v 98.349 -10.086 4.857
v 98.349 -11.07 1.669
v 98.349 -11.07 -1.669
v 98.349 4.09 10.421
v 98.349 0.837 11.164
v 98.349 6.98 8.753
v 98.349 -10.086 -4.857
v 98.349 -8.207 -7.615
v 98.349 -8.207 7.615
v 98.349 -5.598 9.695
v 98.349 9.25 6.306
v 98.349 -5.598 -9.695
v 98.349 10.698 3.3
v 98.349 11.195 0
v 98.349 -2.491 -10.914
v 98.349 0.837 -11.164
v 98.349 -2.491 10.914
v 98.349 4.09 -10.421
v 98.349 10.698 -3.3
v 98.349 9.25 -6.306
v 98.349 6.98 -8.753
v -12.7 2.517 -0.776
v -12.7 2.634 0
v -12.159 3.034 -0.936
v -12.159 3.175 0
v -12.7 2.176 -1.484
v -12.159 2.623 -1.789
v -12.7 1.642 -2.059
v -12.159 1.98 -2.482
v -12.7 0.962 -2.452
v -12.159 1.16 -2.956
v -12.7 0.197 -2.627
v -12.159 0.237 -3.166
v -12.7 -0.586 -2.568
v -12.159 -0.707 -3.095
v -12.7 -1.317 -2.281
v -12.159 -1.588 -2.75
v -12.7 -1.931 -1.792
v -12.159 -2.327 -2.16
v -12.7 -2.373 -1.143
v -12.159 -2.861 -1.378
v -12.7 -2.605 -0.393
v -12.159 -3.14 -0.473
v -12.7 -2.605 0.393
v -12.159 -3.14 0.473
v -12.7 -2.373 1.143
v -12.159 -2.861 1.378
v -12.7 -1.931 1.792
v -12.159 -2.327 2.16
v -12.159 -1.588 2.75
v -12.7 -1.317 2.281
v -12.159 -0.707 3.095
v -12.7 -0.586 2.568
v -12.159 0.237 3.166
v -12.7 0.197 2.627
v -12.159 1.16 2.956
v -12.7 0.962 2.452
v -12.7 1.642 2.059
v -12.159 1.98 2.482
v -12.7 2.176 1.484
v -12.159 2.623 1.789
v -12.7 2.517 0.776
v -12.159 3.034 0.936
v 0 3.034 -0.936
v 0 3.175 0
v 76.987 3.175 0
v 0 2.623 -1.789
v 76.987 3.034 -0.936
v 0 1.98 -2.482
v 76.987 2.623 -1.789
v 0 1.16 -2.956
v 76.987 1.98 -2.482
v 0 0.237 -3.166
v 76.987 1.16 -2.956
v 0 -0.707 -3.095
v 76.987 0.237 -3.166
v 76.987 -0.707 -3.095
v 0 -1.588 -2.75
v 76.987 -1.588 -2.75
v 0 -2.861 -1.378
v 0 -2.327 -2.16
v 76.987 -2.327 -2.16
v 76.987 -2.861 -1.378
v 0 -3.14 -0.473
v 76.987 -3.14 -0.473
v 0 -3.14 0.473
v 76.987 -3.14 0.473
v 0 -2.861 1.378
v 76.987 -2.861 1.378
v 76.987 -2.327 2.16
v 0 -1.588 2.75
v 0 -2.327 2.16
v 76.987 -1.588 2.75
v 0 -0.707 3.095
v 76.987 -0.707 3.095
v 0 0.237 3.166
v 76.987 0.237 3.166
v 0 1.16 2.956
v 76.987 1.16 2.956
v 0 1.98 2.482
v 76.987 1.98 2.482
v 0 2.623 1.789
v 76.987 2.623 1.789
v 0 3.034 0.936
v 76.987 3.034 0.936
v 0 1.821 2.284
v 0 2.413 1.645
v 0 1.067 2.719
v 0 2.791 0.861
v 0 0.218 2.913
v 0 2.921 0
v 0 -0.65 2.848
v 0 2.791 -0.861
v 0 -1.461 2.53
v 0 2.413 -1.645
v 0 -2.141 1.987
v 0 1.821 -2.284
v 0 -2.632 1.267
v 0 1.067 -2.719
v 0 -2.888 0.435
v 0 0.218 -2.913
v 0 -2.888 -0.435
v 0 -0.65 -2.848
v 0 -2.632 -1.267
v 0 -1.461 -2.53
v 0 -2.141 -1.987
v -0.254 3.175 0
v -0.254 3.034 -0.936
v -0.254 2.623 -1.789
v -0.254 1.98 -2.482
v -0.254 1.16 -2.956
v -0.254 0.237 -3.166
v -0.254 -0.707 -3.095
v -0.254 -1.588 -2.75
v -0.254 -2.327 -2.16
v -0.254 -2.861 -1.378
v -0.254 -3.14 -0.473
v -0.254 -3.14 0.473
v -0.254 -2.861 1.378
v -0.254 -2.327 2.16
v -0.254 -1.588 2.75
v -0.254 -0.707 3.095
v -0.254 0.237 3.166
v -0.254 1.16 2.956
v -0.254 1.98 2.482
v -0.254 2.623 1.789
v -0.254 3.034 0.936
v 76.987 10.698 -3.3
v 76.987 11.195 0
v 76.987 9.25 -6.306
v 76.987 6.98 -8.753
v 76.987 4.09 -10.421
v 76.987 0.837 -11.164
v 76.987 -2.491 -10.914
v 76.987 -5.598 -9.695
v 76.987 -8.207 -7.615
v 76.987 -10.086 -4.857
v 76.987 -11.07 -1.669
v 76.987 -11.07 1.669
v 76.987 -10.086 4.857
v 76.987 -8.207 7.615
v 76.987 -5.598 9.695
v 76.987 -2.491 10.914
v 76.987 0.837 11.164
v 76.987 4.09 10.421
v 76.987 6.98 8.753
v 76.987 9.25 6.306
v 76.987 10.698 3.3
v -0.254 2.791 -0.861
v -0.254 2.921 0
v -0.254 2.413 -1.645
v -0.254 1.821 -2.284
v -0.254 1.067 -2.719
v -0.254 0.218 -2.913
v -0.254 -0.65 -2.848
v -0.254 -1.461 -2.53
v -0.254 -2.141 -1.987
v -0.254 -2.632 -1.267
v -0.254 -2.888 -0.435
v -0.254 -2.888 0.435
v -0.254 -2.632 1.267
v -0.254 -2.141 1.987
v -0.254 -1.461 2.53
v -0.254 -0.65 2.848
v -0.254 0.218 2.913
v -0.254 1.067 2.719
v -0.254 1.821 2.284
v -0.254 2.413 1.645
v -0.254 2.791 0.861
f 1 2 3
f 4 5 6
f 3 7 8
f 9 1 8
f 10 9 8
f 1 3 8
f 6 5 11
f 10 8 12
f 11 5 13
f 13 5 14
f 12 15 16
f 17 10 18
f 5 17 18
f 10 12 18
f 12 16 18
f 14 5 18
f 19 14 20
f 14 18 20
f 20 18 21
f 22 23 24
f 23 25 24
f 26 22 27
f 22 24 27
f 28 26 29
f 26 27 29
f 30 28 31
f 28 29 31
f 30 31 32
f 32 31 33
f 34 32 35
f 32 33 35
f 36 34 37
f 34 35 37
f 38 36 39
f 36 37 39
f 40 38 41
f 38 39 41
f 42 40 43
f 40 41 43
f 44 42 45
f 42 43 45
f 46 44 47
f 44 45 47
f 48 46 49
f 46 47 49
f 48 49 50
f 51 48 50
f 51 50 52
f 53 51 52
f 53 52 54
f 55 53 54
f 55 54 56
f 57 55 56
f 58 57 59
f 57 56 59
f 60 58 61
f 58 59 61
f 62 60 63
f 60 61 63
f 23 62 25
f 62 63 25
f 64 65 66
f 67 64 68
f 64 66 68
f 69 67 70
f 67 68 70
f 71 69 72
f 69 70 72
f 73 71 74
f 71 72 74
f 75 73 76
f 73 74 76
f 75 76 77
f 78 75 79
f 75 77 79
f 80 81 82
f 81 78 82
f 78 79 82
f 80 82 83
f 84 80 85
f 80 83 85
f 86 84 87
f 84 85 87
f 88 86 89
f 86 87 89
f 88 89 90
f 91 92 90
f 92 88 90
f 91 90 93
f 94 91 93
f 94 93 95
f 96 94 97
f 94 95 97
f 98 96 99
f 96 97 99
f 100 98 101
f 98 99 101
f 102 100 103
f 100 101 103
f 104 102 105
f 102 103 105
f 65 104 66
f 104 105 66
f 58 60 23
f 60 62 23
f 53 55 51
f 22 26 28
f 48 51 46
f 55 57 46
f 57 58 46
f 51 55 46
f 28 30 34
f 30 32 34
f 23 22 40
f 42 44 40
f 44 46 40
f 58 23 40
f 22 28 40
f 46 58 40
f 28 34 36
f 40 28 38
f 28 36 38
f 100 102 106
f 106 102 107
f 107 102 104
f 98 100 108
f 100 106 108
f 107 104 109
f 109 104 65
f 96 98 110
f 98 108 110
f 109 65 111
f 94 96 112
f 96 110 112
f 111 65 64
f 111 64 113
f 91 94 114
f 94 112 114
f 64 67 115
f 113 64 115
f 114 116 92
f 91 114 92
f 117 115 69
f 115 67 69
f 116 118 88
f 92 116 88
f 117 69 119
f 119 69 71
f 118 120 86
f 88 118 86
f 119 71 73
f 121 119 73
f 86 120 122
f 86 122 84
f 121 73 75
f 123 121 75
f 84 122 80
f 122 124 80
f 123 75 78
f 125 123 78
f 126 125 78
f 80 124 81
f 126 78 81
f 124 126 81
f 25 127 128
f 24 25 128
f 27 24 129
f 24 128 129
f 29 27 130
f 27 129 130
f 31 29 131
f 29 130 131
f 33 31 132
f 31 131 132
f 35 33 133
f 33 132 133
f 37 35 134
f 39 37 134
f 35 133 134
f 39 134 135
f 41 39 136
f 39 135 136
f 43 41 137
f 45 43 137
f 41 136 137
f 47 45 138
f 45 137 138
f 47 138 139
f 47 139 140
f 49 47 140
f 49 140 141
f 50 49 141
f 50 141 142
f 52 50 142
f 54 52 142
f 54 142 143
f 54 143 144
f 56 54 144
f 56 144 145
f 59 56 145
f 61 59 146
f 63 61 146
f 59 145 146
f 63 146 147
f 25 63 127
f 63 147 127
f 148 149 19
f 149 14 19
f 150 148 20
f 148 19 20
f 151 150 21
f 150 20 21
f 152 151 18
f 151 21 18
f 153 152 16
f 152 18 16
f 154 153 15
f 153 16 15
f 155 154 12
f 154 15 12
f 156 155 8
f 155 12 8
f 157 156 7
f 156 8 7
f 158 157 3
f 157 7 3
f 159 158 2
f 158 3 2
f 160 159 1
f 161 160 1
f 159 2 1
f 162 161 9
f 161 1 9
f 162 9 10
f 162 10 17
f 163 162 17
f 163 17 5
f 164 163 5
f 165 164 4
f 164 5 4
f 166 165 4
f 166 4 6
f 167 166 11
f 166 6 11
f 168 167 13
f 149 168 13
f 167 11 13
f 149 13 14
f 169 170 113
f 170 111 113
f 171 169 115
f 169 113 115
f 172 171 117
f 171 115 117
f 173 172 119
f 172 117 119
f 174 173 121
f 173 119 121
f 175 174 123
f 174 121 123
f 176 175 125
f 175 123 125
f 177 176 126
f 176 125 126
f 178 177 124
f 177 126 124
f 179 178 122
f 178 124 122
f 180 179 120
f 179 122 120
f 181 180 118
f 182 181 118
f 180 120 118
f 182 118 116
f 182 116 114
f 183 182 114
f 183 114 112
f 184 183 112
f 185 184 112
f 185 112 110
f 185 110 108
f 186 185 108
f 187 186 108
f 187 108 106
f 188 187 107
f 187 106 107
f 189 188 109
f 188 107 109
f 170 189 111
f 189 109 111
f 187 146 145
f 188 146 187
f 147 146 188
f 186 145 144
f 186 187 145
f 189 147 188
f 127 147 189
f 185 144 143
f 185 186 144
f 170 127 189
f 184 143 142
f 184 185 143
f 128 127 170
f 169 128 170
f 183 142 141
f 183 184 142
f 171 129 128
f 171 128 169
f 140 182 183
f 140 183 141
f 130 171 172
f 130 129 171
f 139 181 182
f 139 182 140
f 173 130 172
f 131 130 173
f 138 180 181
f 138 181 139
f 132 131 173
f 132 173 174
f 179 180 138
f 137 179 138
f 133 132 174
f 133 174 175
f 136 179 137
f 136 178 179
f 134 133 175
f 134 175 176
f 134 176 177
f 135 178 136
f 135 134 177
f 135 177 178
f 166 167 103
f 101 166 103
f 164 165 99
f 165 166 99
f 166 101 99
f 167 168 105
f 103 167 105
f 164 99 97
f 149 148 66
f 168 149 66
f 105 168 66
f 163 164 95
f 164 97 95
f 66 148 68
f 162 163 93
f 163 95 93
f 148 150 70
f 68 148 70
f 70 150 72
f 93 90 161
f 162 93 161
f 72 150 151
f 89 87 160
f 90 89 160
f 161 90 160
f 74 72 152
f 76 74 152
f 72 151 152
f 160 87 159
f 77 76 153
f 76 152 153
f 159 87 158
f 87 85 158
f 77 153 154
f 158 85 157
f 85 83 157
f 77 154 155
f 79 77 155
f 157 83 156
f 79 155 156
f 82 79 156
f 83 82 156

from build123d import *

# Parameters (mm, degrees)
SKETCH3_W = 0.254
SKETCH3_H = 0.508


with BuildPart() as part:
    # Sketch1 → Revolve1 (revolve)
    with BuildSketch(Plane.XY):
        Polygon((0, 0), (0, 3.175), (76.9874, 3.175), (76.9874, 11.19505), (98.3488, 11.19505), (98.3488, 0), align=None)
    revolve(axis=Axis((98.3488, 0, 0), (-1, 0, 0)))

    # Sketch2 → Revolve2 (revolve)
    with BuildSketch(Plane.XY):
        Polygon((-12.7, 0), (-12.7, 2.63398), (-12.15898, 3.175), (0, 3.175), (0, 0), align=None)
    revolve(axis=Axis((0, 0, 0), (-1, 0, 0)))

    # Sketch3 → Cut-Revolve1 (revolve, cut)
    with BuildSketch(Plane.XY):
        with Locations((-0.127, 3.175)):
            Rectangle(SKETCH3_W, SKETCH3_H)
    revolve(axis=Axis((0, 0, 0), (-1, 0, 0)), mode=Mode.SUBTRACT)


solid = part.part
